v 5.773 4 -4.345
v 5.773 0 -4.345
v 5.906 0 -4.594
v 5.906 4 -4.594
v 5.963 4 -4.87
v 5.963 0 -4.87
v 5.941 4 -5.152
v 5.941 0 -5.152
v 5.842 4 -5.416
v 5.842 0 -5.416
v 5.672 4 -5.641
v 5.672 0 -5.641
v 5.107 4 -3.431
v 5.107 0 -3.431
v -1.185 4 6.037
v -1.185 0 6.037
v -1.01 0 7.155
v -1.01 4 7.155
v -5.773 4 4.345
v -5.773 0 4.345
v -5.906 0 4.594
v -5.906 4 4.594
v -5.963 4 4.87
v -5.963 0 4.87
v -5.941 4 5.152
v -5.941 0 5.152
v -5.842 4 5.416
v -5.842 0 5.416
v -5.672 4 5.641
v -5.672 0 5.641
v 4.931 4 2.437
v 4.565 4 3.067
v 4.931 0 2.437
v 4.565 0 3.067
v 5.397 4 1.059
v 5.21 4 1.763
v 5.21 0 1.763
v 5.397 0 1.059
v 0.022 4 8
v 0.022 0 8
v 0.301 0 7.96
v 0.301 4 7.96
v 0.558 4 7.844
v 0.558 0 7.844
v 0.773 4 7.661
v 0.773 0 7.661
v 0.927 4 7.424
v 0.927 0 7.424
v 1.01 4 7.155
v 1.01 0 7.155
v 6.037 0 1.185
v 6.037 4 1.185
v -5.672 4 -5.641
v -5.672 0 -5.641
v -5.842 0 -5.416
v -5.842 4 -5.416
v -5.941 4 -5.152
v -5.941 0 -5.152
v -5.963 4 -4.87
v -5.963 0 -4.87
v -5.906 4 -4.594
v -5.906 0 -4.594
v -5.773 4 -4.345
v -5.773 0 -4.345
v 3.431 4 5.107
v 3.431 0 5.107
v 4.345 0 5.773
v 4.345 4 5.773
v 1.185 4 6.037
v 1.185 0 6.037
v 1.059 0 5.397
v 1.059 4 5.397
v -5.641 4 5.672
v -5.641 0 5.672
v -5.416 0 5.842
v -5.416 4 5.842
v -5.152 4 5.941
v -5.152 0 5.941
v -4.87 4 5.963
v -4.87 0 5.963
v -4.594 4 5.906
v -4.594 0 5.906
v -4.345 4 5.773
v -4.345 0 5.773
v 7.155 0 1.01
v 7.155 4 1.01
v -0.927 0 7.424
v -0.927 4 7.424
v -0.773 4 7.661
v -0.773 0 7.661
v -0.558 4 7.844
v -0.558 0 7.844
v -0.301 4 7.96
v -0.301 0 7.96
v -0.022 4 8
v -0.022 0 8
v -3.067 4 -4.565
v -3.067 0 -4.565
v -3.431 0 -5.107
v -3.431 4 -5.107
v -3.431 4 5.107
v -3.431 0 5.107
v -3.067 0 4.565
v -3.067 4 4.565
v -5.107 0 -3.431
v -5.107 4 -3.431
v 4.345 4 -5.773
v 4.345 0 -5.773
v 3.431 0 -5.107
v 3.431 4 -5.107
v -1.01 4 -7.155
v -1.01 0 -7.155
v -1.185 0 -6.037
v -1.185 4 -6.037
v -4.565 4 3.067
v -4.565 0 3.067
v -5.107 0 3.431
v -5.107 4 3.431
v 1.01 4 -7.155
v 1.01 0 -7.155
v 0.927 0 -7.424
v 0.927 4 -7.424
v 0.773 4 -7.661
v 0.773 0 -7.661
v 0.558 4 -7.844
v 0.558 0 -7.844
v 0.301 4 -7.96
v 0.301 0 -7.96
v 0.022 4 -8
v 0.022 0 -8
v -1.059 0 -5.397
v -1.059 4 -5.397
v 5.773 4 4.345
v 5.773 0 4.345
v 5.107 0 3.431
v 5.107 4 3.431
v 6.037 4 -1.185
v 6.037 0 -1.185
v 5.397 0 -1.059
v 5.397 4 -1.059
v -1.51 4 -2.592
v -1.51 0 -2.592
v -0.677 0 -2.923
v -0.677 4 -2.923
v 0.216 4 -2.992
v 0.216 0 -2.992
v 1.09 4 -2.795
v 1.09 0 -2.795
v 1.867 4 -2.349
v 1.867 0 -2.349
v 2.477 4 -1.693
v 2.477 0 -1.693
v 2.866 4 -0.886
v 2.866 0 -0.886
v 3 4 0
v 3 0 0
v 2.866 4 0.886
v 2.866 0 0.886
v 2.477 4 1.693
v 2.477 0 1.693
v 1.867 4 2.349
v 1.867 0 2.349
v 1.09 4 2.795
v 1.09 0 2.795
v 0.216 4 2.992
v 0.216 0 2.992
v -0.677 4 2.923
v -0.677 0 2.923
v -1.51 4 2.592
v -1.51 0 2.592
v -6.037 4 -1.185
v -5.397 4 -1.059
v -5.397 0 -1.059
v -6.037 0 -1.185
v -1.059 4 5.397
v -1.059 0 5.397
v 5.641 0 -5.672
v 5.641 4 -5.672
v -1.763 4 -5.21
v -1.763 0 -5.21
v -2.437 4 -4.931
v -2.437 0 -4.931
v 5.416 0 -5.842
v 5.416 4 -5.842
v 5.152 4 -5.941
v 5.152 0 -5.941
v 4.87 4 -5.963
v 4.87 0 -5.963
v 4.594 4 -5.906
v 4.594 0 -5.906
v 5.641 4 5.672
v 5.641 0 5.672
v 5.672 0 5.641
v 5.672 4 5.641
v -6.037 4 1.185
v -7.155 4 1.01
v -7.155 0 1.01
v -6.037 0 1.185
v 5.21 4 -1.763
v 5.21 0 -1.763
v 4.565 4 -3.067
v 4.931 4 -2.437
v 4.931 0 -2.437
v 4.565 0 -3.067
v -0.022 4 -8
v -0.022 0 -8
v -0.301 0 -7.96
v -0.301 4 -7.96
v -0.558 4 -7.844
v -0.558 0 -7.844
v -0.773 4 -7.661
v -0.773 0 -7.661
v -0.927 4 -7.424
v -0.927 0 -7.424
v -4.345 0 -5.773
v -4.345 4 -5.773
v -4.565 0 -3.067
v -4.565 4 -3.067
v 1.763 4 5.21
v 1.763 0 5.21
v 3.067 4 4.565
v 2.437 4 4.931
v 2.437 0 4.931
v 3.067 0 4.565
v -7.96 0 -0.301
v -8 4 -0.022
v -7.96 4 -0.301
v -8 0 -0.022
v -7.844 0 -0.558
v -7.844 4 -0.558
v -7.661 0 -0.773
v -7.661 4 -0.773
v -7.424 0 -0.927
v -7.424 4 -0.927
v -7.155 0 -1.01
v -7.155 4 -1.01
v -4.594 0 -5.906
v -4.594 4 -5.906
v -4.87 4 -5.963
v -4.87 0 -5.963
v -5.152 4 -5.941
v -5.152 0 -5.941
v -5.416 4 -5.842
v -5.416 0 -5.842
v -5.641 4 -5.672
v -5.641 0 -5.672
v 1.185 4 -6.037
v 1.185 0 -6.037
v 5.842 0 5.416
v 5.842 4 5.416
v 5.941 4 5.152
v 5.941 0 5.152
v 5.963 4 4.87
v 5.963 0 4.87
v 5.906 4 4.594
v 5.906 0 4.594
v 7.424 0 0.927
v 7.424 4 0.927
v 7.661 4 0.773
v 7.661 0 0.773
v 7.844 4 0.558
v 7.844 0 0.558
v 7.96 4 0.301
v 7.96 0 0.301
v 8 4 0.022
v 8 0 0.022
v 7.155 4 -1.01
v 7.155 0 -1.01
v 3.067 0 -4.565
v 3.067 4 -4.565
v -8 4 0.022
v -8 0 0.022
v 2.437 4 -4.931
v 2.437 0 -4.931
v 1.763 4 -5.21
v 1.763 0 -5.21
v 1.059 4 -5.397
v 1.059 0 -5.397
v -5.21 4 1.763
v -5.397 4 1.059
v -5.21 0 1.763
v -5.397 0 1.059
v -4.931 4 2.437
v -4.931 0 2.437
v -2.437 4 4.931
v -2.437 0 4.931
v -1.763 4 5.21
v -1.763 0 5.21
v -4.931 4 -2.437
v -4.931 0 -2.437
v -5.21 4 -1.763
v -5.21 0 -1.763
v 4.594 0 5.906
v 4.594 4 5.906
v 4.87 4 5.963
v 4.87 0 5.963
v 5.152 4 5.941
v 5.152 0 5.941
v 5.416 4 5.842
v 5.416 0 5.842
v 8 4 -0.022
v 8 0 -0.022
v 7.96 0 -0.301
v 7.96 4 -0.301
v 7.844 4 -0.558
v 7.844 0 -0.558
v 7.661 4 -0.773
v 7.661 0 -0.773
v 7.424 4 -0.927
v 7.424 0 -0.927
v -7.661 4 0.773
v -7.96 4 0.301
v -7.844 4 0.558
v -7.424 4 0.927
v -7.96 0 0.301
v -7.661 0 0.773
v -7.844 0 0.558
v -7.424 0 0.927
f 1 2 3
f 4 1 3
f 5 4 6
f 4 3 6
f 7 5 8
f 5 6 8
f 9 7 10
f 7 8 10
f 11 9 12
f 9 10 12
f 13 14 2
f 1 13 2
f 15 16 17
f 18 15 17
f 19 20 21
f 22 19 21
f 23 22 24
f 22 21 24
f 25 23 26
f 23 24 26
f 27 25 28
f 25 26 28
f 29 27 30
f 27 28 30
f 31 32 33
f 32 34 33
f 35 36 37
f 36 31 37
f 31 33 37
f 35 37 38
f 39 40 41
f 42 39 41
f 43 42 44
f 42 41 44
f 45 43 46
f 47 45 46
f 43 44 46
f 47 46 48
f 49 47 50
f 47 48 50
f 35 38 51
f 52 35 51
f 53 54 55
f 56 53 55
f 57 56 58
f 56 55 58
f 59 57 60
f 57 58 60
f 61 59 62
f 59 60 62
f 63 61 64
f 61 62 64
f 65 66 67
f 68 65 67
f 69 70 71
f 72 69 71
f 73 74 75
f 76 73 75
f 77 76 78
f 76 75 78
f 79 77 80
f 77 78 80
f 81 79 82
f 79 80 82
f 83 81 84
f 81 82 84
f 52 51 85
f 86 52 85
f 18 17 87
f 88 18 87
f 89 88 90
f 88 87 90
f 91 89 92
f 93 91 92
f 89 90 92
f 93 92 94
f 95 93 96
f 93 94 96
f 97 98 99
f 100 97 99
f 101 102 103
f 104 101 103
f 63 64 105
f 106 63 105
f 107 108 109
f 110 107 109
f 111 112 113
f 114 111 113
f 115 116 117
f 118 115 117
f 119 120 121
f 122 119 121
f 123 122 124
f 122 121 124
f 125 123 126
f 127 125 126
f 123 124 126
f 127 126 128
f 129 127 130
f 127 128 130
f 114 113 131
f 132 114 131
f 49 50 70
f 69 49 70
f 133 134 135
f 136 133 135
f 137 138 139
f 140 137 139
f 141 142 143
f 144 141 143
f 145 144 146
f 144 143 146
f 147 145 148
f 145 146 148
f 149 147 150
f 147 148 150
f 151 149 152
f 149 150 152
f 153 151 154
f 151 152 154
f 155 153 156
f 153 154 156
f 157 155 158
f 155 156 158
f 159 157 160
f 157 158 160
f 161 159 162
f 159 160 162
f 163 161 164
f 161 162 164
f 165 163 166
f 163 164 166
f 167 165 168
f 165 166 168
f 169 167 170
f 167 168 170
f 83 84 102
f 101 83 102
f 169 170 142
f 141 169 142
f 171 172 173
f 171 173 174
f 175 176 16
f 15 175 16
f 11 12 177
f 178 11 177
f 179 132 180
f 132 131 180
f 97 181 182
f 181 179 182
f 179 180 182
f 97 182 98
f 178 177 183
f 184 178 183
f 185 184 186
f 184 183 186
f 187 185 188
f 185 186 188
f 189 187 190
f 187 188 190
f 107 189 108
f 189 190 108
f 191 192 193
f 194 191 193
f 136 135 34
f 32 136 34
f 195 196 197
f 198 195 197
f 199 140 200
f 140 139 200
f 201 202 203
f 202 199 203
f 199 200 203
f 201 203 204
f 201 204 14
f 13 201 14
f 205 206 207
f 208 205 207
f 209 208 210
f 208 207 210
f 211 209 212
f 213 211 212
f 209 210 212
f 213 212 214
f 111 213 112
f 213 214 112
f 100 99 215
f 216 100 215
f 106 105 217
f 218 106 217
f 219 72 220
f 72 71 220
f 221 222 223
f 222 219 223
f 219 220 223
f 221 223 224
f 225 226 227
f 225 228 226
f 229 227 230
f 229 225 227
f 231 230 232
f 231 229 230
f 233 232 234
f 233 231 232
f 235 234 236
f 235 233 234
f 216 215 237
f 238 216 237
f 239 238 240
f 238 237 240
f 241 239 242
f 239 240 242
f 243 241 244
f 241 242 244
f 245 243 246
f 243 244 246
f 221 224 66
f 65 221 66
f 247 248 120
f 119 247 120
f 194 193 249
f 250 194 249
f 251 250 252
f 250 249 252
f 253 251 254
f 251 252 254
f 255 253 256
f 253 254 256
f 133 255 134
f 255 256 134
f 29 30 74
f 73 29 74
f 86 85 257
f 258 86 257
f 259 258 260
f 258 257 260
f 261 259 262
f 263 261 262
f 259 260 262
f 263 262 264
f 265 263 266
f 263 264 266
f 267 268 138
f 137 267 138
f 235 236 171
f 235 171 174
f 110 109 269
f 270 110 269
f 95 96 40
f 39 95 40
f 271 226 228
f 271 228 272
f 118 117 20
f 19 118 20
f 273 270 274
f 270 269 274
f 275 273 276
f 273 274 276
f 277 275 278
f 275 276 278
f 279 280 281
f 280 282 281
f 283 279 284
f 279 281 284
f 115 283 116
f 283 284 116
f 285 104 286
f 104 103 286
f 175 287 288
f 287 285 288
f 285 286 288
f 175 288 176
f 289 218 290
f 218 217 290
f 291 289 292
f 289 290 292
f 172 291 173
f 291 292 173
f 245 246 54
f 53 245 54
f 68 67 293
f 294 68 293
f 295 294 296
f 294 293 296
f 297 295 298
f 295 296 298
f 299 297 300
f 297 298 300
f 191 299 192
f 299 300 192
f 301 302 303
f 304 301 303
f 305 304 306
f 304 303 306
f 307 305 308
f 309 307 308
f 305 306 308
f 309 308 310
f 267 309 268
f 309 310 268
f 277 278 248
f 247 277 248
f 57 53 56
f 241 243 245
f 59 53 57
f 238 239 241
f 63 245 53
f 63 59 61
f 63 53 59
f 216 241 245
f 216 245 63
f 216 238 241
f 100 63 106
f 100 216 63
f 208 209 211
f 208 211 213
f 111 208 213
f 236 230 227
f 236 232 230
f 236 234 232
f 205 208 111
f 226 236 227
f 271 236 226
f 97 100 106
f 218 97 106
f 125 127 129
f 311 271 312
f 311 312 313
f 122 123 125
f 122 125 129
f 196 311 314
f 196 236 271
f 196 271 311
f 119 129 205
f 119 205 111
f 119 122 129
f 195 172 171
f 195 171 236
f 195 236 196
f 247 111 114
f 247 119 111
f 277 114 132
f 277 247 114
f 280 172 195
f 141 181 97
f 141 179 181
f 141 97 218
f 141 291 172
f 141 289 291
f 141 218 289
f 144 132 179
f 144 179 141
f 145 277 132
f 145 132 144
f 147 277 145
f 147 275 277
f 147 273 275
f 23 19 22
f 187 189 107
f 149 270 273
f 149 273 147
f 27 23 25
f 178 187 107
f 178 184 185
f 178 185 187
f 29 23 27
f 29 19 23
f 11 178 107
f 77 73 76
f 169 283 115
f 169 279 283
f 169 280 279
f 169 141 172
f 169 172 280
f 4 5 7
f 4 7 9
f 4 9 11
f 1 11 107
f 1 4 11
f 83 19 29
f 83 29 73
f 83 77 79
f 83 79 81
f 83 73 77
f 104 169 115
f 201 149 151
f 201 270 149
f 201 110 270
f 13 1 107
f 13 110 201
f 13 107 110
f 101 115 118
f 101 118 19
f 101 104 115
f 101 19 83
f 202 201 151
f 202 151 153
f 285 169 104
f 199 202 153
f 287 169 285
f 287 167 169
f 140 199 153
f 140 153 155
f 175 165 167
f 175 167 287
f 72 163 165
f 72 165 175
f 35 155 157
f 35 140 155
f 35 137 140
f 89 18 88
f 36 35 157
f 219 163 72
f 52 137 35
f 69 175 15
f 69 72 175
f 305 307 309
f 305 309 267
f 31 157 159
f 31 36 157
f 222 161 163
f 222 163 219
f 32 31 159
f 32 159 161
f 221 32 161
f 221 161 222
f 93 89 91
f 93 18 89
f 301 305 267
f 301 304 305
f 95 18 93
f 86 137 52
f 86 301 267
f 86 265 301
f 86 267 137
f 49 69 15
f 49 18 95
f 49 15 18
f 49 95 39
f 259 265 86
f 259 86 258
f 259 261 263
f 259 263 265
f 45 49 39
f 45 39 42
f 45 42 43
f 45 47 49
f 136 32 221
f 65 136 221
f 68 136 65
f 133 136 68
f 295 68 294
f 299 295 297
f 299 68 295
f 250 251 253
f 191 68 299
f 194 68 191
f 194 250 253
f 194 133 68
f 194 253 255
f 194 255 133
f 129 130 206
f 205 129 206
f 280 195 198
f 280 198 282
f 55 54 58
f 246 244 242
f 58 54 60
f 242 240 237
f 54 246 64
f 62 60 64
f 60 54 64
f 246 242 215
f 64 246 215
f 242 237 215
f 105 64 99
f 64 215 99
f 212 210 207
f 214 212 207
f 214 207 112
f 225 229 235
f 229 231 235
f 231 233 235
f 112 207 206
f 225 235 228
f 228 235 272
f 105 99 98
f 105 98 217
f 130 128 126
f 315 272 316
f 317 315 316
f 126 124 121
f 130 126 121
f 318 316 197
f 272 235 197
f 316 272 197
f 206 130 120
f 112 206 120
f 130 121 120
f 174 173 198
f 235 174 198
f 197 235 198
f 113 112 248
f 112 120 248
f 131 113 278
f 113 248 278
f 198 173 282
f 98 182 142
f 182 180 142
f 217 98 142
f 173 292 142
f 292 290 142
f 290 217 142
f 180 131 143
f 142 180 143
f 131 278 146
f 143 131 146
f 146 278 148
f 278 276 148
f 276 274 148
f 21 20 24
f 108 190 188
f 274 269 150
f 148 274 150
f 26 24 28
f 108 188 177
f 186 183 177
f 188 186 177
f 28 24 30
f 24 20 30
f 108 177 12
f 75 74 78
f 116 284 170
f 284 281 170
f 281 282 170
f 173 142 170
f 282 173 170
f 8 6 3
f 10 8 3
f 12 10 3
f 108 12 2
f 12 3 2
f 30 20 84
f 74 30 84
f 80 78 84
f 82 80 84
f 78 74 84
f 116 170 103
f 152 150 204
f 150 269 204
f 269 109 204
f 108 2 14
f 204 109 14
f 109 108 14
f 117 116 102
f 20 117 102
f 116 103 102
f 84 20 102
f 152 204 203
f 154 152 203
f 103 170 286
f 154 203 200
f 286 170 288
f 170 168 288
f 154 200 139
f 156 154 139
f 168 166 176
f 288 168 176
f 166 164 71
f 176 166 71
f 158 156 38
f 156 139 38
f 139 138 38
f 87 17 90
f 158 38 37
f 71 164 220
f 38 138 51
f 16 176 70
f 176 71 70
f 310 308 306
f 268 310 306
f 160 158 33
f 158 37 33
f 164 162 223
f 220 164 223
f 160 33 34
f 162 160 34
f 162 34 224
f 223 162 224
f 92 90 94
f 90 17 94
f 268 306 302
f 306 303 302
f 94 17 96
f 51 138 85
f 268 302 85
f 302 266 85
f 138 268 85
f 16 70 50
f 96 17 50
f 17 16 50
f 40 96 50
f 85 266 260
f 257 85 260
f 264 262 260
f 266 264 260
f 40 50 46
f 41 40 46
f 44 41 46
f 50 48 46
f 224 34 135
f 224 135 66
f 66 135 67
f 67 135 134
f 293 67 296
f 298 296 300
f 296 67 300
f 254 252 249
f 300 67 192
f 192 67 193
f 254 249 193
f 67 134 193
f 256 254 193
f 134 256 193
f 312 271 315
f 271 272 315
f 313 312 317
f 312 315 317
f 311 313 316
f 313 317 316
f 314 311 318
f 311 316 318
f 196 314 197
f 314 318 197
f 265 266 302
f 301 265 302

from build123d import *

# Parameters (mm, degrees)
SKETCH1_R           = 5.5
BOSS_EXTRUDE1_DEPTH = 4
BOSS_EXTRUDE4_DEPTH = 4
CHAMFER5_SIZE       = 2
CHAMFER5_SIZE2      = 0.69237056
CHAMFER6_SIZE       = 2
CHAMFER6_SIZE2      = 0.69237056
FILLET1_R           = 1
CIRPATTERN2_DEPTH   = 4


# Read off the part's stored shape, not the designer's step: CirPattern2
with BuildPart() as part:
    # Sketch1 → Boss-Extrude1 (new body)
    with BuildSketch(Plane(origin=(0, 0, 0), x_dir=(1, 0, 0), z_dir=(0, 1, 0))):
        with Locations(Location((0, 0, 0), (0, 0, 270))):
            Circle(SKETCH1_R)
        with BuildLine():
            Line((-1.51, -2.592276991), (-1.51, 2.592276991))
            ThreePointArc((-1.51, 2.592276991), (3, 0), (-1.51, -2.592276991))
        make_face(mode=Mode.SUBTRACT)
    extrude(amount=BOSS_EXTRUDE1_DEPTH)

    # Sketch2 → Boss-Extrude4 (add)
    with BuildSketch(Plane(origin=(0, 4, 0), x_dir=(1, 0, 0), z_dir=(0, 1, 0))):
        with BuildLine():
            Line((-4.906409736, 0.962882911), (-8, 1.57))
            Line((-8, 1.57), (-8, -1.57))
            Line((-8, -1.57), (-4.906409736, -0.962882911))
            ThreePointArc((-4.906409736, -0.962882911), (-5, 0), (-4.906409736, 0.962882911))
        make_face()
    extrude(amount=-BOSS_EXTRUDE4_DEPTH)

    # Chamfer5
    chamfer5_edges = [part.edges().sort_by_distance(p)[0] for p in [
        (-8, 2, -1.57),
    ]]
    chamfer5_side = [part.faces().sort_by_distance(p)[0] for p in [
        (-6.698525355, 2, -1.314585601),
    ]]
    chamfer(chamfer5_edges, length=CHAMFER5_SIZE, length2=CHAMFER5_SIZE2, reference=chamfer5_side[0])

    # Chamfer6
    chamfer6_edges = [part.edges().sort_by_distance(p)[0] for p in [
        (-8, 2, 1.57),
    ]]
    chamfer6_side = [part.faces().sort_by_distance(p)[0] for p in [
        (-6.698525355, 2, 1.314585601),
    ]]
    chamfer(chamfer6_edges, length=CHAMFER6_SIZE, length2=CHAMFER6_SIZE2, reference=chamfer6_side[0])

    # Fillet1
    fillet1_edges = [part.edges().sort_by_distance(p)[0] for p in [
        (-8, 2, -0.87762944),
        (-8, 2, 0.87762944),
    ]]
    fillet(fillet1_edges, radius=FILLET1_R)

    # CirPattern2 outline → CirPattern2 (add)
    with BuildSketch(Plane(origin=(0, 0, 0), x_dir=(1, 0, 0), z_dir=(0, 1, 0))):
        with BuildLine():
            ThreePointArc((-3.067344016, -4.565238295), (-3.889087297, -3.889087297), (-4.565238295, -3.067344016))
            Line((-4.565238295, -3.067344016), (-5.106925243, -3.431298779))
            Line((-5.106925243, -3.431298779), (-5.773253973, -4.344956726))
            ThreePointArc((-5.773253973, -4.344956726), (-5.962284465, -5.0117594), (-5.672403665, -5.641304834))
            Line((-5.672403665, -5.641304834), (-5.641304834, -5.672403665))
            ThreePointArc((-5.641304834, -5.672403665), (-5.0117594, -5.962284465), (-4.344956726, -5.773253973))
            Line((-4.344956726, -5.773253973), (-3.431298779, -5.106925243))
            Line((-3.431298779, -5.106925243), (-3.067344016, -4.565238295))
        make_face()
        with BuildLine():
            ThreePointArc((-4.565238295, 3.067344016), (-3.889087297, 3.889087297), (-3.067344016, 4.565238295))
            Line((-3.067344016, 4.565238295), (-3.431298779, 5.106925243))
            Line((-3.431298779, 5.106925243), (-4.344956726, 5.773253973))
            ThreePointArc((-4.344956726, 5.773253973), (-5.0117594, 5.962284465), (-5.641304834, 5.672403665))
            Line((-5.641304834, 5.672403665), (-5.672403665, 5.641304834))
            ThreePointArc((-5.672403665, 5.641304834), (-5.962284465, 5.0117594), (-5.773253973, 4.344956726))
            Line((-5.773253973, 4.344956726), (-5.106925243, 3.431298779))
            Line((-5.106925243, 3.431298779), (-4.565238295, 3.067344016))
        make_face()
        with BuildLine():
            ThreePointArc((-1.059171202, 5.39705071), (0, 5.5), (1.059171202, 5.39705071))
            Line((1.059171202, 5.39705071), (1.184846836, 6.037436105))
            Line((1.184846836, 6.037436105), (1.009958669, 7.154655399))
            ThreePointArc((1.009958669, 7.154655399), (0.672122719, 7.759820834), (0.021990194, 8))
            Line((0.021990194, 8), (-0.021990194, 8))
            ThreePointArc((-0.021990194, 8), (-0.672122719, 7.759820834), (-1.009958669, 7.154655399))
            Line((-1.009958669, 7.154655399), (-1.184846836, 6.037436105))
            Line((-1.184846836, 6.037436105), (-1.059171202, 5.39705071))
        make_face()
        with BuildLine():
            ThreePointArc((3.067344016, 4.565238295), (3.889087297, 3.889087297), (4.565238295, 3.067344016))
            Line((4.565238295, 3.067344016), (5.106925243, 3.431298779))
            Line((5.106925243, 3.431298779), (5.773253973, 4.344956726))
            ThreePointArc((5.773253973, 4.344956726), (5.962284465, 5.0117594), (5.672403665, 5.641304834))
            Line((5.672403665, 5.641304834), (5.641304834, 5.672403665))
            ThreePointArc((5.641304834, 5.672403665), (5.0117594, 5.962284465), (4.344956726, 5.773253973))
            Line((4.344956726, 5.773253973), (3.431298779, 5.106925243))
            Line((3.431298779, 5.106925243), (3.067344016, 4.565238295))
        make_face()
        with BuildLine():
            ThreePointArc((5.39705071, 1.059171202), (5.5, 0), (5.39705071, -1.059171202))
            Line((5.39705071, -1.059171202), (6.037436105, -1.184846836))
            Line((6.037436105, -1.184846836), (7.154655399, -1.009958669))
            ThreePointArc((7.154655399, -1.009958669), (7.759820834, -0.672122719), (8, -0.021990194))
            Line((8, -0.021990194), (8, 0.021990194))
            ThreePointArc((8, 0.021990194), (7.759820834, 0.672122719), (7.154655399, 1.009958669))
            Line((7.154655399, 1.009958669), (6.037436105, 1.184846836))
            Line((6.037436105, 1.184846836), (5.39705071, 1.059171202))
        make_face()
        with BuildLine():
            ThreePointArc((4.565238295, -3.067344016), (3.889087297, -3.889087297), (3.067344016, -4.565238295))
            Line((3.067344016, -4.565238295), (3.431298779, -5.106925243))
            Line((3.431298779, -5.106925243), (4.344956726, -5.773253973))
            ThreePointArc((4.344956726, -5.773253973), (5.0117594, -5.962284465), (5.641304834, -5.672403665))
            Line((5.641304834, -5.672403665), (5.672403665, -5.641304834))
            ThreePointArc((5.672403665, -5.641304834), (5.962284465, -5.0117594), (5.773253973, -4.344956726))
            Line((5.773253973, -4.344956726), (5.106925243, -3.431298779))
            Line((5.106925243, -3.431298779), (4.565238295, -3.067344016))
        make_face()
        with BuildLine():
            ThreePointArc((1.059171202, -5.39705071), (0, -5.5), (-1.059171202, -5.39705071))
            Line((-1.059171202, -5.39705071), (-1.184846836, -6.037436105))
            Line((-1.184846836, -6.037436105), (-1.009958669, -7.154655399))
            ThreePointArc((-1.009958669, -7.154655399), (-0.672122719, -7.759820834), (-0.021990194, -8))
            Line((-0.021990194, -8), (0.021990194, -8))
            ThreePointArc((0.021990194, -8), (0.672122719, -7.759820834), (1.009958669, -7.154655399))
            Line((1.009958669, -7.154655399), (1.184846836, -6.037436105))
            Line((1.184846836, -6.037436105), (1.059171202, -5.39705071))
        make_face()
    extrude(amount=CIRPATTERN2_DEPTH)


solid = part.part
